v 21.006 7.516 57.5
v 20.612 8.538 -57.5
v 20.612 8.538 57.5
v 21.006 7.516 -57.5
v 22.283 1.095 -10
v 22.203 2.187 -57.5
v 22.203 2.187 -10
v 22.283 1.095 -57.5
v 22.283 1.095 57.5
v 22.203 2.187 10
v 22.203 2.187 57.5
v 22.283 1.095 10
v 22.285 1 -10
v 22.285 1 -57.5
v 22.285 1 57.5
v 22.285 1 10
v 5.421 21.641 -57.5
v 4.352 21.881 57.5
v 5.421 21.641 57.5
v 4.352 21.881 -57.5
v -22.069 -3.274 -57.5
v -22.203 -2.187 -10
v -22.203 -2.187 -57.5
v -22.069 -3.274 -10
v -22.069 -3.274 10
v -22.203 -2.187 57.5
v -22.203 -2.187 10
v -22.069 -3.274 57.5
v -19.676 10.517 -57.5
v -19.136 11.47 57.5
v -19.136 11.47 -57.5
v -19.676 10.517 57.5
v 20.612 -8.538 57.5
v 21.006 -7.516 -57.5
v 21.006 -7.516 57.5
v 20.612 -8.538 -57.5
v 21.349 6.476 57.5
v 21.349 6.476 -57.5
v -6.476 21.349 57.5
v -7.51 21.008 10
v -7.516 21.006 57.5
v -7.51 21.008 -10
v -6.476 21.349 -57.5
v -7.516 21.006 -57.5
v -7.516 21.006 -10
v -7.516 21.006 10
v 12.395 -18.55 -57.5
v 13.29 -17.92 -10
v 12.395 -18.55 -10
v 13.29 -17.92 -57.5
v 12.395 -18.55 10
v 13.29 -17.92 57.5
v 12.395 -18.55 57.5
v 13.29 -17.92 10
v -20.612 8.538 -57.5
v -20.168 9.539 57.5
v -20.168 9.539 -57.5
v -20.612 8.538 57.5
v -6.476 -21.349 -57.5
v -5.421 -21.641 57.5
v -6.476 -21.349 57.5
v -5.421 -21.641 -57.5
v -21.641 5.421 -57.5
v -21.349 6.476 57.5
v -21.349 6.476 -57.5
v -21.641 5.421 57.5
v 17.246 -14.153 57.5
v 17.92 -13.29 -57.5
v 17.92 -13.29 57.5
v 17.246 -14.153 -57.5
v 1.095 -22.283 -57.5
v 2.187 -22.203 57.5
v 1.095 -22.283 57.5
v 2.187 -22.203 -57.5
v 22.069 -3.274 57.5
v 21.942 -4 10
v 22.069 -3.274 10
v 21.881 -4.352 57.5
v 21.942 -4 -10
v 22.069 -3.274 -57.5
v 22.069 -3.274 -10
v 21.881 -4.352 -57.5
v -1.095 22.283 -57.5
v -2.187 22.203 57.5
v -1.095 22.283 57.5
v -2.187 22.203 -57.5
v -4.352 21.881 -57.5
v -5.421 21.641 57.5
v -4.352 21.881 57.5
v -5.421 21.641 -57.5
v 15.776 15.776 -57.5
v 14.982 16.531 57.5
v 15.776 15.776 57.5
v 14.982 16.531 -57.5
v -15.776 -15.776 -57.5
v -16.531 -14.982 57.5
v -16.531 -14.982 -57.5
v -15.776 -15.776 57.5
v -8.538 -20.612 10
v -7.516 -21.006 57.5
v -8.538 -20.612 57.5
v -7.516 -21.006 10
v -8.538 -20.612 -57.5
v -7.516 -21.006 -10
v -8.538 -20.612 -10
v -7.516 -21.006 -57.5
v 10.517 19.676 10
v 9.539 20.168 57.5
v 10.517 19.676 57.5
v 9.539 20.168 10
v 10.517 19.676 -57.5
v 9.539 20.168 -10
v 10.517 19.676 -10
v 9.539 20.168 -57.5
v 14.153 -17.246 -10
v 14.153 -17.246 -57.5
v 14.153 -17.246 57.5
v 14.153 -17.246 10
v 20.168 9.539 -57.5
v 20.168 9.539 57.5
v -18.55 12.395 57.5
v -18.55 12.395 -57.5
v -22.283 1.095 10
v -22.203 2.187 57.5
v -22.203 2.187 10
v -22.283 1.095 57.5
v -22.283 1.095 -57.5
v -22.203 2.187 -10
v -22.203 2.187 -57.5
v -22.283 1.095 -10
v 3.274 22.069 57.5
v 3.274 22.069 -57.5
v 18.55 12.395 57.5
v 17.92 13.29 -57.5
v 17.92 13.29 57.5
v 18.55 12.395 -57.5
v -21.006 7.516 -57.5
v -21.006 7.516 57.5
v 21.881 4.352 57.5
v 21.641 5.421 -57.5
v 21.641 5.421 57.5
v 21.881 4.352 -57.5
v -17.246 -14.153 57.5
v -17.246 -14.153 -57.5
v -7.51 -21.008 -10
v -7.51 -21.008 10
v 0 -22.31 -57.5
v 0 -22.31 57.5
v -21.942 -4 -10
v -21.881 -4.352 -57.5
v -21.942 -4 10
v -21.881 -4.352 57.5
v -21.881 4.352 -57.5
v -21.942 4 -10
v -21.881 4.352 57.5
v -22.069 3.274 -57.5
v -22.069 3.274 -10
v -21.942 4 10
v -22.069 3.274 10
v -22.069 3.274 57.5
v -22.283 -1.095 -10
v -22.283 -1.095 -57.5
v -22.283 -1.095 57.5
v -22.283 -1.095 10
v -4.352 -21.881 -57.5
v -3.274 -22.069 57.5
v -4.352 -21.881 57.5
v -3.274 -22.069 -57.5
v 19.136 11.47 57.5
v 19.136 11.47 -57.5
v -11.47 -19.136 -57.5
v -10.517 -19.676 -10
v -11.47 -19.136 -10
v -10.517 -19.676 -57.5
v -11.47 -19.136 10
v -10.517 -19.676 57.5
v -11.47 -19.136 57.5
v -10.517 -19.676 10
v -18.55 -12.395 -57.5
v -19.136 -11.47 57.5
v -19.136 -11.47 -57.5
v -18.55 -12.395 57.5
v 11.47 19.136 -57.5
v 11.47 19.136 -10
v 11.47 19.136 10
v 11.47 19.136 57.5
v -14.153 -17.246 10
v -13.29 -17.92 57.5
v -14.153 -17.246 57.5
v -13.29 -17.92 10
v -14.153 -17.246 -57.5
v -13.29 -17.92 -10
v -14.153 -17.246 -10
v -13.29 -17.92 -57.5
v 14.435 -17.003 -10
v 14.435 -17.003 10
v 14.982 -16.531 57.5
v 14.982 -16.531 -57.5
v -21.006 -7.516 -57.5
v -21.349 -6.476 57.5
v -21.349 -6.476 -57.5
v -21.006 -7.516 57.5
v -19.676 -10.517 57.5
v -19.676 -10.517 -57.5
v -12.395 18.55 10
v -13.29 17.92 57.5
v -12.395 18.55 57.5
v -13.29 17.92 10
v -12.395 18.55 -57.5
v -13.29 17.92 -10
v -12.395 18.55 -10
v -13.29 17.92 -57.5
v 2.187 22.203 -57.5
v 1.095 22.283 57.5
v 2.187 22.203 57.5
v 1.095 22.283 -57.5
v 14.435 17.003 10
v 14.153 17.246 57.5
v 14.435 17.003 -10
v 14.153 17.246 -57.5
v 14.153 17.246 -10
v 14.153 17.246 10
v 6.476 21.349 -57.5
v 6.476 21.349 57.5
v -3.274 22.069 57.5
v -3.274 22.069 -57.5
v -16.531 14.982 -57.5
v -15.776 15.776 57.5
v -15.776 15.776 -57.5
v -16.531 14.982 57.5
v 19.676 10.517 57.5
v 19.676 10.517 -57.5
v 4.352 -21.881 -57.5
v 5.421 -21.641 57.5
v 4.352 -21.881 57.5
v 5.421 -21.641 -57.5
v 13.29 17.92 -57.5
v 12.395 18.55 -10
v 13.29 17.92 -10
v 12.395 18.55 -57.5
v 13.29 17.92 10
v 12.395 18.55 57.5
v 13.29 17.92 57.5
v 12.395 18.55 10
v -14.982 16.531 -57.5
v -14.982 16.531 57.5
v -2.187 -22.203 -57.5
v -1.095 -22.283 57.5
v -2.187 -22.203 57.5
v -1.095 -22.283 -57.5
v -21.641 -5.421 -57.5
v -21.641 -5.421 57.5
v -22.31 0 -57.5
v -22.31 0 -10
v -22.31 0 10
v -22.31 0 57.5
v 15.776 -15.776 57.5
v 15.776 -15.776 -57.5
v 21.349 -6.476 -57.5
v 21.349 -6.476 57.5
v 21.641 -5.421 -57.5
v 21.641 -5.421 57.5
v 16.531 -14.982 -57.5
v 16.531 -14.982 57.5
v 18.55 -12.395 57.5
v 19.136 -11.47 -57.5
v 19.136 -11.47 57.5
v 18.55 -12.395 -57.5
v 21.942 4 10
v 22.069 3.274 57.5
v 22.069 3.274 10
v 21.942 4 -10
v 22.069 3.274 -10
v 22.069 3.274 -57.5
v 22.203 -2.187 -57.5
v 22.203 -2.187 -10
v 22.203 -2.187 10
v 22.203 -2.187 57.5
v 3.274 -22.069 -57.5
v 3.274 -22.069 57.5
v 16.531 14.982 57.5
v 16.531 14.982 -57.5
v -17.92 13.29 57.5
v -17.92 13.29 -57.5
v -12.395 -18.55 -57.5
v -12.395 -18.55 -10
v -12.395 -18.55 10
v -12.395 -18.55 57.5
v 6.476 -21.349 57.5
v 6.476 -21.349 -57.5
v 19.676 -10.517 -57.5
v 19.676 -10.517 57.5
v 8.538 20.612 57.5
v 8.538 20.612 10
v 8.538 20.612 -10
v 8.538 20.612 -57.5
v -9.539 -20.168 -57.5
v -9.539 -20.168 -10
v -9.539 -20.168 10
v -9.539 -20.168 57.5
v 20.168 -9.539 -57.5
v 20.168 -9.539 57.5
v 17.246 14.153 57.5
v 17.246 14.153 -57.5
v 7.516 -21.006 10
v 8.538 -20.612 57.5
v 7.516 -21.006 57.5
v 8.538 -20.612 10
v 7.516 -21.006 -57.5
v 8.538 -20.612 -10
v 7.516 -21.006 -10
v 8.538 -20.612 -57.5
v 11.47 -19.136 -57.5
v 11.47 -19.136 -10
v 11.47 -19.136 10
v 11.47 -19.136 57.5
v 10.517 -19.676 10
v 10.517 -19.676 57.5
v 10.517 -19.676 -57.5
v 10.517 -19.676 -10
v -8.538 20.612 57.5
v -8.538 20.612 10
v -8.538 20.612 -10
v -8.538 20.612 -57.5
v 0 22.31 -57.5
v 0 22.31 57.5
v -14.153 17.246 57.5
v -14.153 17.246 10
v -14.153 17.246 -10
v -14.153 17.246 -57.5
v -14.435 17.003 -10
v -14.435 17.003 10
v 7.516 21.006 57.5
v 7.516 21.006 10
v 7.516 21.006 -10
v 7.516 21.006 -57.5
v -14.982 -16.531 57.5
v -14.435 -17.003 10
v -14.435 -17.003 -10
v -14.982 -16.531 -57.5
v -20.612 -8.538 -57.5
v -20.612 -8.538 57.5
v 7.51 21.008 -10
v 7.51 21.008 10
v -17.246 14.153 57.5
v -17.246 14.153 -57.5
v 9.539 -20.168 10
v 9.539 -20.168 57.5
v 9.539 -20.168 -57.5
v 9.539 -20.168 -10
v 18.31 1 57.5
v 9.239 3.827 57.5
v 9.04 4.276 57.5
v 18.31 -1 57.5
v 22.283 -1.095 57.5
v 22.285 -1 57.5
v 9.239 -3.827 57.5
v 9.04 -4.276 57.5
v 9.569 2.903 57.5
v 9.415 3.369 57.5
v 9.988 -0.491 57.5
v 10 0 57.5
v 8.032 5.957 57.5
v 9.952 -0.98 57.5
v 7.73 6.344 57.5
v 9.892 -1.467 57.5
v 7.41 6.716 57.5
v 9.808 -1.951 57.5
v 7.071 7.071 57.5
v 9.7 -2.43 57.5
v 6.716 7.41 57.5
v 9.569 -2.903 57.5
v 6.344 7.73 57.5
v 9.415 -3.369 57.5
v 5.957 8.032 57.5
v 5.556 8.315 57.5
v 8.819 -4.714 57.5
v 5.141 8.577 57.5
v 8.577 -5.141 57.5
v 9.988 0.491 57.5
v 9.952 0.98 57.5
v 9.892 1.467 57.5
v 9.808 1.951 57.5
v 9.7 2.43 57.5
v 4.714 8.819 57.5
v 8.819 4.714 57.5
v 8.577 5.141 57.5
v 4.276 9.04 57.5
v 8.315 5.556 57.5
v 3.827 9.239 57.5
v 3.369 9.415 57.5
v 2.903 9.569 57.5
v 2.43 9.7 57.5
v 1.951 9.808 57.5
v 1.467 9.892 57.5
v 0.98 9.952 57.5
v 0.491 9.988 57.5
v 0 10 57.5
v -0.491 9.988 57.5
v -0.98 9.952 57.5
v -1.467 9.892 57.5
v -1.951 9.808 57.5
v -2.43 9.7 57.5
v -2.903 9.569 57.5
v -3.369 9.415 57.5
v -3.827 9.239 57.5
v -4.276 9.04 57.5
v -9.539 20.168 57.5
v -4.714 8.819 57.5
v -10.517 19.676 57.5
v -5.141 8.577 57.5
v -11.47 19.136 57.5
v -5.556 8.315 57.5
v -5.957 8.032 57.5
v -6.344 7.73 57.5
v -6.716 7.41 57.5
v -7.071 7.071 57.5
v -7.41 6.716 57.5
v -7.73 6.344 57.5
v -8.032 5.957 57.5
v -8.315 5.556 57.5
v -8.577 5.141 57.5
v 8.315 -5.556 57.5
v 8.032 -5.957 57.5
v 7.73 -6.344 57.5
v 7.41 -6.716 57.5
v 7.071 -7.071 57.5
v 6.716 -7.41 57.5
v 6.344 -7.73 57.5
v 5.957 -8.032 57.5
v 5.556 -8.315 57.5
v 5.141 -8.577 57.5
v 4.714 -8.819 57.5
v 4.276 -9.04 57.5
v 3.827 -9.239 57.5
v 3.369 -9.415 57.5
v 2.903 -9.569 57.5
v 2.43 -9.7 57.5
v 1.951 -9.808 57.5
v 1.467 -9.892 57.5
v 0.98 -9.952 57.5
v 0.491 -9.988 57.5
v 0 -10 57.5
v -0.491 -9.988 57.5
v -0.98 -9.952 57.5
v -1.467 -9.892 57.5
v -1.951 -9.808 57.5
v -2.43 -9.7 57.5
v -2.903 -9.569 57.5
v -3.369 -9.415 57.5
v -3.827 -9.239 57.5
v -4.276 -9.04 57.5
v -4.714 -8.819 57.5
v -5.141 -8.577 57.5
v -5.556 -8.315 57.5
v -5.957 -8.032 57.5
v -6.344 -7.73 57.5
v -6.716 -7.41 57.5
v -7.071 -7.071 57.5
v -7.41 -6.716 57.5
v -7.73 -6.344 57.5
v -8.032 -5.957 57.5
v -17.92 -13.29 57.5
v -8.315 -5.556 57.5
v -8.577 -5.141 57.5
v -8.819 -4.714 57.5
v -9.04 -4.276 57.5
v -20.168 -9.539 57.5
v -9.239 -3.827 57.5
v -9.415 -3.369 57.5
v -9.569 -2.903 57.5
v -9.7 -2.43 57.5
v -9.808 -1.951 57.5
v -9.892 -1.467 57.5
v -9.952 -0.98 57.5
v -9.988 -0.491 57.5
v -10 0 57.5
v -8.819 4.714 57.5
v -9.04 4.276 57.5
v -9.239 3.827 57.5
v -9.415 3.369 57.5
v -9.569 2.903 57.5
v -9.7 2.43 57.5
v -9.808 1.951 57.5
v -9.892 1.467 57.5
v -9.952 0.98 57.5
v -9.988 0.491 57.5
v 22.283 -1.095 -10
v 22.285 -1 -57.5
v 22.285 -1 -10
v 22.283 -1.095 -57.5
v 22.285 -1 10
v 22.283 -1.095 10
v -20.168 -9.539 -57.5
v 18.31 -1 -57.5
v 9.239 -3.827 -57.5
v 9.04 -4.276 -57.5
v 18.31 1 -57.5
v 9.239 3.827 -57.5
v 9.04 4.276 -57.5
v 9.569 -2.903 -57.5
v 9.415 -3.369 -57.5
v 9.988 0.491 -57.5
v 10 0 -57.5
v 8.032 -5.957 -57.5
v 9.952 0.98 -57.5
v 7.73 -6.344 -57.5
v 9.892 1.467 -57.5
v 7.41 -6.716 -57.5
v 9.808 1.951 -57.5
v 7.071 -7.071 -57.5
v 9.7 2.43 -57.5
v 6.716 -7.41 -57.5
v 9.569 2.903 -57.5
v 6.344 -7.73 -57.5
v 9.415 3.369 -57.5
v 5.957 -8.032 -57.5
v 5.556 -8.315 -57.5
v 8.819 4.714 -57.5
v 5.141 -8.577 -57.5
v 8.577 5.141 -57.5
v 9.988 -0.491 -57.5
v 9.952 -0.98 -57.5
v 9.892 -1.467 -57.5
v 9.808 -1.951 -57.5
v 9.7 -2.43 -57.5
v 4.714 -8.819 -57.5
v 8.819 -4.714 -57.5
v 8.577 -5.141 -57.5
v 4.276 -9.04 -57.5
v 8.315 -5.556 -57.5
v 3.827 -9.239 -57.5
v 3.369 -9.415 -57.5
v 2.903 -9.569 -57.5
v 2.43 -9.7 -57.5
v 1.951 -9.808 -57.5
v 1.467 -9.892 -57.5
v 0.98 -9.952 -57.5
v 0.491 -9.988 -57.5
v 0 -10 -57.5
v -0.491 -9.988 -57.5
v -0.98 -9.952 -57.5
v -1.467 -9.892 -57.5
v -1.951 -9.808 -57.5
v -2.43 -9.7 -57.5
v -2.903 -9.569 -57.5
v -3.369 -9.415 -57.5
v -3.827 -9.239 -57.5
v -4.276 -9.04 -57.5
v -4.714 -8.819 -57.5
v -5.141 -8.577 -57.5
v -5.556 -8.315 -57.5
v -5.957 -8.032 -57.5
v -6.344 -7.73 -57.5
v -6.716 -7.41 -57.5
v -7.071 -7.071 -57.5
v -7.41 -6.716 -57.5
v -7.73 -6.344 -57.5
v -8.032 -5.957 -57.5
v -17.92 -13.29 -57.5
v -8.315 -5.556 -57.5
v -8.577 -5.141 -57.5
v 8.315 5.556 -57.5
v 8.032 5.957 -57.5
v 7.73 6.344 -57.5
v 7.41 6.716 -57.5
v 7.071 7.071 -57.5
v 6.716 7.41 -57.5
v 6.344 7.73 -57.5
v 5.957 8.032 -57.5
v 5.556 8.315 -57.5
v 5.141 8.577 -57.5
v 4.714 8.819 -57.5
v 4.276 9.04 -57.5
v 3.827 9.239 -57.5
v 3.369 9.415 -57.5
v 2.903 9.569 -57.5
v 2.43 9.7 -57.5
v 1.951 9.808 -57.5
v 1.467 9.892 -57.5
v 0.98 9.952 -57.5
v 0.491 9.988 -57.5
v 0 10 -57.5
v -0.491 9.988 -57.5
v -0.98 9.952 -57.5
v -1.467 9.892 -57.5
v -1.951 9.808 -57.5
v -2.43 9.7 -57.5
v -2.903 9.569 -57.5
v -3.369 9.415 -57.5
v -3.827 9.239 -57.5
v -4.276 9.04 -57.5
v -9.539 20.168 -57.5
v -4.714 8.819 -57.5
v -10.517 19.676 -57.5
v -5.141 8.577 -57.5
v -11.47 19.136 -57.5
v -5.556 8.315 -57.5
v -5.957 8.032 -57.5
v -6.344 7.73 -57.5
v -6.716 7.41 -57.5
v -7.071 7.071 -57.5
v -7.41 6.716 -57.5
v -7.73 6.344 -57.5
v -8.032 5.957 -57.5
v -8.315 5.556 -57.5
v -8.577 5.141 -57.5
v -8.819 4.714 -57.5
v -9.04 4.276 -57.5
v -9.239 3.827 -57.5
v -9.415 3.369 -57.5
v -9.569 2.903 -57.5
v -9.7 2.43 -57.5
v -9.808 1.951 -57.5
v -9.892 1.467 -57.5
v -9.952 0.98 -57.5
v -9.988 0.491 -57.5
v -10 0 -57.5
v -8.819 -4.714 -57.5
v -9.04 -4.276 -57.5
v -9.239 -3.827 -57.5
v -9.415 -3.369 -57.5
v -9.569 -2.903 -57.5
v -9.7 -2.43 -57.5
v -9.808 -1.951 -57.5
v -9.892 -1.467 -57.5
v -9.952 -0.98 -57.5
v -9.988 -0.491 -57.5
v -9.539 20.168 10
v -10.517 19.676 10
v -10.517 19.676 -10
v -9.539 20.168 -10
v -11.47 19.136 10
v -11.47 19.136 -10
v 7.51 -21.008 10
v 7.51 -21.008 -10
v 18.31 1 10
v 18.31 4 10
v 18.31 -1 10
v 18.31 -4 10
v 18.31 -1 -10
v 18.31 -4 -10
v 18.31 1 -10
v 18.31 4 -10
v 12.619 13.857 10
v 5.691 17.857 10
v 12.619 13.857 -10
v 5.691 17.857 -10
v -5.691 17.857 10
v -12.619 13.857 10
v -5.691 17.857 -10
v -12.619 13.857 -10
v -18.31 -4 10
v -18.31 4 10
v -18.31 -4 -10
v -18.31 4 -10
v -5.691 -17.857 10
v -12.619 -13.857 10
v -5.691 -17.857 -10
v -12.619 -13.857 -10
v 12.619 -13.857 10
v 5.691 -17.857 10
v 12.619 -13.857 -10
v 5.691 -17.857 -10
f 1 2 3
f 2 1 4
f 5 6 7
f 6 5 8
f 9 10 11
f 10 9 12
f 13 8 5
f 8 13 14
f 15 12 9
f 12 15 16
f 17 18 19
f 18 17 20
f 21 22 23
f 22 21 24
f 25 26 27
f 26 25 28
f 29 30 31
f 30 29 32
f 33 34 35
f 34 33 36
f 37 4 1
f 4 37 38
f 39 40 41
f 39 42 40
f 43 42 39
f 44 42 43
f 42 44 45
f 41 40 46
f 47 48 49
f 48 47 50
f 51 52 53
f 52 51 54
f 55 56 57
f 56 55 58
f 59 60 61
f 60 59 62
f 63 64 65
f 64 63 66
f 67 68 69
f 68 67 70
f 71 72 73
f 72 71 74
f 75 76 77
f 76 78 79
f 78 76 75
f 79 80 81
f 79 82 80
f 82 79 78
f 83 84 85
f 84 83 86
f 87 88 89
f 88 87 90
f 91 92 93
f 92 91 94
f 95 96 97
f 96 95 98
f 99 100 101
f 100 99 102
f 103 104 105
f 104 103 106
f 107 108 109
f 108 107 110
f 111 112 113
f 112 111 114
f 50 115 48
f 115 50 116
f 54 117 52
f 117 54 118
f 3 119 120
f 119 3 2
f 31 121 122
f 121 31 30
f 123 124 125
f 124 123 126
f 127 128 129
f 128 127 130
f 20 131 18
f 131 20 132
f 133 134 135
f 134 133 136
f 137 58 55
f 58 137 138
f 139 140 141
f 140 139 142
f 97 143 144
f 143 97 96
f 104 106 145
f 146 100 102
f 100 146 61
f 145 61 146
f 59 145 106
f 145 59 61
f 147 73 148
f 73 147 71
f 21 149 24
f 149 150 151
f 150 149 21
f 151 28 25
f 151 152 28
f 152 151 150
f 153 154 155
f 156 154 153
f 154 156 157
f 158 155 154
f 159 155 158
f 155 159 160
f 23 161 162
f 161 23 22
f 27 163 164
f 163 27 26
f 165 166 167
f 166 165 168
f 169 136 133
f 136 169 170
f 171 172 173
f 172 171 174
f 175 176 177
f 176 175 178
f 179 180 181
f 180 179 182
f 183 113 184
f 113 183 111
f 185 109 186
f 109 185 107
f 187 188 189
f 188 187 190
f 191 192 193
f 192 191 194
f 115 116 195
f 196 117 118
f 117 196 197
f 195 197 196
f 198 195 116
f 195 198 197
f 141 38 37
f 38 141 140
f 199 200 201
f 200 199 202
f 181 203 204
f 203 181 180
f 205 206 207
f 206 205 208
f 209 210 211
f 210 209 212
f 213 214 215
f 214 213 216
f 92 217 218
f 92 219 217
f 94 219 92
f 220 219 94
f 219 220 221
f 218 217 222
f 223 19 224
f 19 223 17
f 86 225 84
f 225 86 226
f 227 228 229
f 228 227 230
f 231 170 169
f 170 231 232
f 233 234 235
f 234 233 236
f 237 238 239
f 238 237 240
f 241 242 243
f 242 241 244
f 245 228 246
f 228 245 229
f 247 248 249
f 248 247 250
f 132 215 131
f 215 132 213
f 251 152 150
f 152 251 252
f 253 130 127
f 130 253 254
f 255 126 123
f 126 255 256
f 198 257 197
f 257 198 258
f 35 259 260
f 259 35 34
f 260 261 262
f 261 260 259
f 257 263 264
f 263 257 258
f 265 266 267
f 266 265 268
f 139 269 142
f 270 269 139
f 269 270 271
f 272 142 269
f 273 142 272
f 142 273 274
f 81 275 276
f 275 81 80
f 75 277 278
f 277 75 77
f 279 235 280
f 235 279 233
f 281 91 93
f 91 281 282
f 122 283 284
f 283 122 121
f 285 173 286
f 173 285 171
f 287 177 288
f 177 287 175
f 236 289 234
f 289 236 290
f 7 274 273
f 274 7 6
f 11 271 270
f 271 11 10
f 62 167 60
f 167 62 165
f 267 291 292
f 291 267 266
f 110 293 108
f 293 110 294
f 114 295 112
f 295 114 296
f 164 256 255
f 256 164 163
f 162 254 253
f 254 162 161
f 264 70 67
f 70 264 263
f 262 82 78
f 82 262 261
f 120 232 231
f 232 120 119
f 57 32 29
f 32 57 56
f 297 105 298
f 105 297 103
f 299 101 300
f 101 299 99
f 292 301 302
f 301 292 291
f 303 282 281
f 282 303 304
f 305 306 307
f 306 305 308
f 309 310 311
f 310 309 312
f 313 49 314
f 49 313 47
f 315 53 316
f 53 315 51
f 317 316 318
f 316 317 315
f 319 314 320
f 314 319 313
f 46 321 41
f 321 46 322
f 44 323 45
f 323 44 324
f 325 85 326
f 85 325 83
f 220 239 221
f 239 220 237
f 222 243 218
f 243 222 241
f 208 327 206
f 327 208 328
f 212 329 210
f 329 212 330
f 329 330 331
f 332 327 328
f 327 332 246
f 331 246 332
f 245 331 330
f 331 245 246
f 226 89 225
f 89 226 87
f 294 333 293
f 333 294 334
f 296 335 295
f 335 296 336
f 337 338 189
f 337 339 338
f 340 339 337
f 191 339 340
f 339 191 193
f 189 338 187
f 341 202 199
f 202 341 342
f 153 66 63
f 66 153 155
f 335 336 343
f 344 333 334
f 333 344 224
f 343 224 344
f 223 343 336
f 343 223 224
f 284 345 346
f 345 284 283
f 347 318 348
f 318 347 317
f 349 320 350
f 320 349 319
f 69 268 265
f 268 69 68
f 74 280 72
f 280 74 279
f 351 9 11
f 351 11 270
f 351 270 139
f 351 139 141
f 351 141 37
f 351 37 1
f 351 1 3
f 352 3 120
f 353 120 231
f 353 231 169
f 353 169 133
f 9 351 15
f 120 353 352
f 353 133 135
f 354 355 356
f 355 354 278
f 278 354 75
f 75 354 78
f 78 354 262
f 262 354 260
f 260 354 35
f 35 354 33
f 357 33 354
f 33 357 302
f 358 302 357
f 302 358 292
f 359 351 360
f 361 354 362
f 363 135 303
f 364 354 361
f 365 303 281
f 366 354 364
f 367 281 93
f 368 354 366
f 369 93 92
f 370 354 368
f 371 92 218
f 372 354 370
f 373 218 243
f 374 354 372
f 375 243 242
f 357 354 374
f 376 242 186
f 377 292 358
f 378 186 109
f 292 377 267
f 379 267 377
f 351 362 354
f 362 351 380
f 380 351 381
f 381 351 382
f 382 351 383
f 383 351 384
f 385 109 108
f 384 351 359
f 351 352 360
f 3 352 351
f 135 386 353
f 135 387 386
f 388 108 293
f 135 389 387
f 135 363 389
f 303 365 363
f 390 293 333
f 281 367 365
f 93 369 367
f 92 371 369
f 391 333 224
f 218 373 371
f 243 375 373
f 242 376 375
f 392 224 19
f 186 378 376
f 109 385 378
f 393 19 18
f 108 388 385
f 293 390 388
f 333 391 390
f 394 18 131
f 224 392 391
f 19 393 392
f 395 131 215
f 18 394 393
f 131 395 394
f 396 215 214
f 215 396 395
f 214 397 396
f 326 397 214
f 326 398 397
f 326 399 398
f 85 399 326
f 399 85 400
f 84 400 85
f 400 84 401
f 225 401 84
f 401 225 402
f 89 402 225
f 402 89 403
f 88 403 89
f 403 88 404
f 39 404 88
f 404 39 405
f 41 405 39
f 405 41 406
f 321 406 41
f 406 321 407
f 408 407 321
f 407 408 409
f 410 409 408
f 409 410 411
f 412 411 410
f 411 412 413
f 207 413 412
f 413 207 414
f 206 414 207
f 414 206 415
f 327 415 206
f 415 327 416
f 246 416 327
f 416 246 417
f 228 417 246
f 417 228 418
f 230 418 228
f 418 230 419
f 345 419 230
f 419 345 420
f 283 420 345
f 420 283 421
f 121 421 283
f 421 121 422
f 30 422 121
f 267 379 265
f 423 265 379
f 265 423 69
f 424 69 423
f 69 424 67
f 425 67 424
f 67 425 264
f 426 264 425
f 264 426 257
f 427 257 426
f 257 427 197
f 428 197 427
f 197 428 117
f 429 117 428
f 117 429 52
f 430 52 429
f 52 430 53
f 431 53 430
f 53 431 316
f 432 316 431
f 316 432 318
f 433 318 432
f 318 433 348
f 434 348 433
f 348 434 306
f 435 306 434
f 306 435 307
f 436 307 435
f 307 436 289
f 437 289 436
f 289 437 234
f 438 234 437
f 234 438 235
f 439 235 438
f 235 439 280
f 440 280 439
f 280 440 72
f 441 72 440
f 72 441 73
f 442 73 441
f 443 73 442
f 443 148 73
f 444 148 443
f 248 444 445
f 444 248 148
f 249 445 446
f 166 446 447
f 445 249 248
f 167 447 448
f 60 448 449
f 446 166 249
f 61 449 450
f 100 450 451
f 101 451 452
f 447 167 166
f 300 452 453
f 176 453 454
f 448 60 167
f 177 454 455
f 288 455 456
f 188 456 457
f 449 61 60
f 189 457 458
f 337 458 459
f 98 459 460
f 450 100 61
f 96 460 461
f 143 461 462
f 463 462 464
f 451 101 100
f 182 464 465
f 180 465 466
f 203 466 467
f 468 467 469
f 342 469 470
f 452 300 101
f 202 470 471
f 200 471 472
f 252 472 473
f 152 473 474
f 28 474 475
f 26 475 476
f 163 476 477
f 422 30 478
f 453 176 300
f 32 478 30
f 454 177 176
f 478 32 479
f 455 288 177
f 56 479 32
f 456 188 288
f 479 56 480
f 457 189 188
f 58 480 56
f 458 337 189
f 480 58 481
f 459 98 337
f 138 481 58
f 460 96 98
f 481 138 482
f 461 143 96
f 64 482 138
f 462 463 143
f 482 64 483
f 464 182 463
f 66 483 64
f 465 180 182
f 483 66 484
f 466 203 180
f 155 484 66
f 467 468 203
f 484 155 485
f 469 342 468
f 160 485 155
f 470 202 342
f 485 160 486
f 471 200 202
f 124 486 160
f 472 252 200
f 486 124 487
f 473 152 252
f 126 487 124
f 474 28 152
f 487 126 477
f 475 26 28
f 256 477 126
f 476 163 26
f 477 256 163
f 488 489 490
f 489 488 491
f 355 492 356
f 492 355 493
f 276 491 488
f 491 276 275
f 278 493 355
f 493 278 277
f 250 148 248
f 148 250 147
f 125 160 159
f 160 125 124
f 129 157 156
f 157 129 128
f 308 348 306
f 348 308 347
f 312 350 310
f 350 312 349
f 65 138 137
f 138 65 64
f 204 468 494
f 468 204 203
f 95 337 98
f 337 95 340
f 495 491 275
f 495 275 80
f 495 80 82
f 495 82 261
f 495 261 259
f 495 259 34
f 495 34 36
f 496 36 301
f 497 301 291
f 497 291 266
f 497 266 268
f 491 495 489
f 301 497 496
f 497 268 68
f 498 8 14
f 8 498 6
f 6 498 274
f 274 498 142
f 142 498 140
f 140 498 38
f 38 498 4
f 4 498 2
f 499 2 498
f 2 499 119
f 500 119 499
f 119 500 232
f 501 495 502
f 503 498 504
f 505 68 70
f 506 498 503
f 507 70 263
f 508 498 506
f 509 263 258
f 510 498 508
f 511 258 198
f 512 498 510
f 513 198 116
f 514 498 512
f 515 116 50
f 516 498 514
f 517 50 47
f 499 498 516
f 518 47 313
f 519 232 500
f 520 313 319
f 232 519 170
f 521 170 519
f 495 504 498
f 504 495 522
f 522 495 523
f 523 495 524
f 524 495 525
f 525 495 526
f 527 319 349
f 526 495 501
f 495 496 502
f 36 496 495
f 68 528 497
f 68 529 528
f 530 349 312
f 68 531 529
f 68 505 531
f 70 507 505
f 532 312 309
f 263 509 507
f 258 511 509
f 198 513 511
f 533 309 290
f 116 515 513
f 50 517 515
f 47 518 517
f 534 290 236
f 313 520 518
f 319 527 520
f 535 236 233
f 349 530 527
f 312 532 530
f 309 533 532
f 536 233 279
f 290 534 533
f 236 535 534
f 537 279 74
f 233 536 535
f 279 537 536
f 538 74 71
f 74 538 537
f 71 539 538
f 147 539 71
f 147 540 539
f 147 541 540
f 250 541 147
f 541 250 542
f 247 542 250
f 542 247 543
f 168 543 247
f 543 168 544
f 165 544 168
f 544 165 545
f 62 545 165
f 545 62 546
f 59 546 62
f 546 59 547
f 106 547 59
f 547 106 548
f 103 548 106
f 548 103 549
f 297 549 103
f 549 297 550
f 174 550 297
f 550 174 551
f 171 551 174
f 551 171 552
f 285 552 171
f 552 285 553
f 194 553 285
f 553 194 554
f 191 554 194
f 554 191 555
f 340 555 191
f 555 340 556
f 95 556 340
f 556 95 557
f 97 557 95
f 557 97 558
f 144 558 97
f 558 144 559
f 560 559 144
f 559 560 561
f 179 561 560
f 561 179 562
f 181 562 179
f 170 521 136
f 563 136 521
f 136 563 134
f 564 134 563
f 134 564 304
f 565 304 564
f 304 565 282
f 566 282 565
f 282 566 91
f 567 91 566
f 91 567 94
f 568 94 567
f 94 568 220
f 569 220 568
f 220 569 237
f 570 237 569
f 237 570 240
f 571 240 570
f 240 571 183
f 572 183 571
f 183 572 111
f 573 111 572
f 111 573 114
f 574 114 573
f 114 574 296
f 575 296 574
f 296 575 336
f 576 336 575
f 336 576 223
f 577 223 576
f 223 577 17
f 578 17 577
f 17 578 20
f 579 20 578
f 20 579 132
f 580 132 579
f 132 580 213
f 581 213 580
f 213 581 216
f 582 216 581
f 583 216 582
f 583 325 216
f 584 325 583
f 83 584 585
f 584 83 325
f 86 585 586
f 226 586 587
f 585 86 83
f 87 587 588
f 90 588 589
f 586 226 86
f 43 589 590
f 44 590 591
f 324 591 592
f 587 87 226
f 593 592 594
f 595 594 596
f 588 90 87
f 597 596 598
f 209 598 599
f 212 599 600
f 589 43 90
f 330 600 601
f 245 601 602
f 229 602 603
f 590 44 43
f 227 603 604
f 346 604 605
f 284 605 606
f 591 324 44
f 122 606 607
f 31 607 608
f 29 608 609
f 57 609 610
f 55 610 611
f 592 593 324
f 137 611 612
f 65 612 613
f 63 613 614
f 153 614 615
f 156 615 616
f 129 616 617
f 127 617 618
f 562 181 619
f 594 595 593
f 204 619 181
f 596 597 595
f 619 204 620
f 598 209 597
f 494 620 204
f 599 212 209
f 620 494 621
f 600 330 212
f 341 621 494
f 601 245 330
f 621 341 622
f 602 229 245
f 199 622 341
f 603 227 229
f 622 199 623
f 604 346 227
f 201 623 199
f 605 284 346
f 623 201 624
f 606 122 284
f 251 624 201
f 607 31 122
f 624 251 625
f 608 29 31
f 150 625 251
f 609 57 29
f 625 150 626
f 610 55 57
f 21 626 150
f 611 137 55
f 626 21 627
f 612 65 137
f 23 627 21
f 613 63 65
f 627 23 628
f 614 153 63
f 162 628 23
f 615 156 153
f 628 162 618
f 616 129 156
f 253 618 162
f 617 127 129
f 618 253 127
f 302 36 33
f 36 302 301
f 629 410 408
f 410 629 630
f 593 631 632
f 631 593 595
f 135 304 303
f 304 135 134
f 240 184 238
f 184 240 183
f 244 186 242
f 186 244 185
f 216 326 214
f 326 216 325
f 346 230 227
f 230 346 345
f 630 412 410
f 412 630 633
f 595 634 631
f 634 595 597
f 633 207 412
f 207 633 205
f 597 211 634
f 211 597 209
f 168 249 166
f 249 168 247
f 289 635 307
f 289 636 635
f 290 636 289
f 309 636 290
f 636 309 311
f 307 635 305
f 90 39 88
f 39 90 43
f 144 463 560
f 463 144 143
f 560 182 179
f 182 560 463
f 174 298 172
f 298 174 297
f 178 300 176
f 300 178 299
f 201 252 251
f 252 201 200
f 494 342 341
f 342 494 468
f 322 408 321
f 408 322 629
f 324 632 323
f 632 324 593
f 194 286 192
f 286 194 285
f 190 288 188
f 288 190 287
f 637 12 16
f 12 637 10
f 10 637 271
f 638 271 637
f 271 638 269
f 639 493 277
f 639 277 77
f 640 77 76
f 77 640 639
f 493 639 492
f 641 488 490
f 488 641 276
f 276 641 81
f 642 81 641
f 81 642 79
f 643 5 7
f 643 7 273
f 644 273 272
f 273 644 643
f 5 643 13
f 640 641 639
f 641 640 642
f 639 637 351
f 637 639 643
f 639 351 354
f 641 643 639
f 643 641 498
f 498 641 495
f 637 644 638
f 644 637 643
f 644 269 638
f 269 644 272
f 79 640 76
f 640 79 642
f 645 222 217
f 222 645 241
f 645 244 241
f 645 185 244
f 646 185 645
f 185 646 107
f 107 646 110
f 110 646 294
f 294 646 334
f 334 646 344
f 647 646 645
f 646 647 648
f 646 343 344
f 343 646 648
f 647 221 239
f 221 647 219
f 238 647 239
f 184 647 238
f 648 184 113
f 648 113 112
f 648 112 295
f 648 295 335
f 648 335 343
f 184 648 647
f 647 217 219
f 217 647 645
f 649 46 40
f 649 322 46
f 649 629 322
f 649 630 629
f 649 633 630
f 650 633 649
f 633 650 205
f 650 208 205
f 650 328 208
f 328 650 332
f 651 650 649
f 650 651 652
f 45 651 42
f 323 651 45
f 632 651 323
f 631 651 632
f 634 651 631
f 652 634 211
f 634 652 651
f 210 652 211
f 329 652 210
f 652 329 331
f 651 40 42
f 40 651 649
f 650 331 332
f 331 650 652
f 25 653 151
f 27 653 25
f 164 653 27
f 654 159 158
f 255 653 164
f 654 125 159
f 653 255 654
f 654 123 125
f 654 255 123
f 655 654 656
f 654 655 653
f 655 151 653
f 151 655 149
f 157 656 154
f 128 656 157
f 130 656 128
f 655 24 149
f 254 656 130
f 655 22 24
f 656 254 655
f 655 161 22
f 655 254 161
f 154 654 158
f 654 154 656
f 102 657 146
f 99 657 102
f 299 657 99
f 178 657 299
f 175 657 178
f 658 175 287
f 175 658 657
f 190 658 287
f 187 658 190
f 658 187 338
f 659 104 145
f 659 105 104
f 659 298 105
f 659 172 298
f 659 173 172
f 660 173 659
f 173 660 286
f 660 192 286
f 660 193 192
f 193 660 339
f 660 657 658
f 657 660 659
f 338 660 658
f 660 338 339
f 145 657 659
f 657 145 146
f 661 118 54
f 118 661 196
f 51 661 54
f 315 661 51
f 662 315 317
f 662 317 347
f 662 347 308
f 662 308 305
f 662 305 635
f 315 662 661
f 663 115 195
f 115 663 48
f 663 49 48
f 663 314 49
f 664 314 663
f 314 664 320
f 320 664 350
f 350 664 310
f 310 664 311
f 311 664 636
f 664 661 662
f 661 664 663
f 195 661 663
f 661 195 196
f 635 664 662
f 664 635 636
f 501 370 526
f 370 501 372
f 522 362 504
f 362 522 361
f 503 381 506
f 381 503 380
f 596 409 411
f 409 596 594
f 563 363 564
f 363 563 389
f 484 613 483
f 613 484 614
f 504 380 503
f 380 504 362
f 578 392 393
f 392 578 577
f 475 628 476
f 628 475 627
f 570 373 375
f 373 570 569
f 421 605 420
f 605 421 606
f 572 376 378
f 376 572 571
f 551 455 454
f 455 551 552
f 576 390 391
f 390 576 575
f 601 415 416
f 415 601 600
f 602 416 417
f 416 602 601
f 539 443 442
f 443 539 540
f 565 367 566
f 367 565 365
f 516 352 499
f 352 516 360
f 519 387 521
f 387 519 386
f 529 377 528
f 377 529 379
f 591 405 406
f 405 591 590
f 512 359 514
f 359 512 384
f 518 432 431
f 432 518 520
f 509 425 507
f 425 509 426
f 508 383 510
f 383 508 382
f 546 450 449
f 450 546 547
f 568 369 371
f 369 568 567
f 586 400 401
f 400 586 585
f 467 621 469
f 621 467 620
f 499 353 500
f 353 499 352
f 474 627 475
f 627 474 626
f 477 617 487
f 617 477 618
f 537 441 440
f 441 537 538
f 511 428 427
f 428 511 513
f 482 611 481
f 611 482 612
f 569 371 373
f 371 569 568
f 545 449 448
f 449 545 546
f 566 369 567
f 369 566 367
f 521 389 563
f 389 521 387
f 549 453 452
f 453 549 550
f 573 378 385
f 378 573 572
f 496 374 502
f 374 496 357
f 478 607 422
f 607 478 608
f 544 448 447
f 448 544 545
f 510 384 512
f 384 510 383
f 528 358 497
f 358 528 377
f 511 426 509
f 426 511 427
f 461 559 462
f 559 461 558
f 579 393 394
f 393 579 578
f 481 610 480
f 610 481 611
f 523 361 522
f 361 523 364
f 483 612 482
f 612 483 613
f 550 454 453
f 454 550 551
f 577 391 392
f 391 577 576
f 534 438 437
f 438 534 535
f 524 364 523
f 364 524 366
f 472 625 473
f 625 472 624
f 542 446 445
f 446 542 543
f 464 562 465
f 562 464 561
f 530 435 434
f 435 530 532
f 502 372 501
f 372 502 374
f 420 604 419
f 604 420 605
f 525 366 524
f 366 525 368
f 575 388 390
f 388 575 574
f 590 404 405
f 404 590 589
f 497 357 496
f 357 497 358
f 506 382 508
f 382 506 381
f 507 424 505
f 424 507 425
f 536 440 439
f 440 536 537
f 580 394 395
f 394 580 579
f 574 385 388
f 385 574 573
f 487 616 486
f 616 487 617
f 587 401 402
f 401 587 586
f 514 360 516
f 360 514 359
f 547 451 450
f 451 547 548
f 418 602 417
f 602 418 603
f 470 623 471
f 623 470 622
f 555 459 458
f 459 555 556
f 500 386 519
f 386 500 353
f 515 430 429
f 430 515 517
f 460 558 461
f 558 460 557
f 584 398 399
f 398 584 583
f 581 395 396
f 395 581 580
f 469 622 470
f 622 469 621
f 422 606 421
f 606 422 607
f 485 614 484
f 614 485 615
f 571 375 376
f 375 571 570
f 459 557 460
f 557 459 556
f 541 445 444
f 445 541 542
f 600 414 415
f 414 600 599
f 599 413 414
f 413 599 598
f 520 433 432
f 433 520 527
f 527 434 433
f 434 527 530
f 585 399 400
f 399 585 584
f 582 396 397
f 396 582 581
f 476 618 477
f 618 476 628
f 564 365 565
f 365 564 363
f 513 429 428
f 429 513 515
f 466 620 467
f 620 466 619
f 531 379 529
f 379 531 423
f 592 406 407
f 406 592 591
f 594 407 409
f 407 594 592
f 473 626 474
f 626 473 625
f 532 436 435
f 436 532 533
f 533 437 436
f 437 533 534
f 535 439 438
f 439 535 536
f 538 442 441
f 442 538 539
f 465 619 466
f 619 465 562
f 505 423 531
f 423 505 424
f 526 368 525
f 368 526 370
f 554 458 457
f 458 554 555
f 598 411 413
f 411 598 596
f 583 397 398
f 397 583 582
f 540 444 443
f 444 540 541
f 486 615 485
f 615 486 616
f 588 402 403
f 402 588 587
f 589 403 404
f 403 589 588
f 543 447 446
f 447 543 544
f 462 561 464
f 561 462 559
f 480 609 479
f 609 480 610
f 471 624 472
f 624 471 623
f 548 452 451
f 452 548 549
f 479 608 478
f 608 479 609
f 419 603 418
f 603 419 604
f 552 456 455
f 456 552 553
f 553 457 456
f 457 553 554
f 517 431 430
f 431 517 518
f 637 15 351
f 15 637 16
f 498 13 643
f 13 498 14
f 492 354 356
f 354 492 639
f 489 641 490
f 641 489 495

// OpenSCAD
$fn = 128;

// Parameters (match given bounding box and requested features)
bbox_X = 45.0;          // overall X bound
bbox_Y = 44.62;         // overall Y bound (also used as outer_D)
H = 115.0;              // height

outer_D = 44.62;        // outer diameter (Y bound)
bore_D  = 20.0;         // central bore diameter

notch_count = 6;        // several notches around circumference
notch_ang_offset_deg = 0.0;

notch_depth_radial = 4.0;       // how far notch cuts into OD
notch_width_tangential = 8.0;   // notch width along tangent
notch_height_Z = 20.0;          // notch height along Z
notch_Z_center = 0.0;           // notch vertical position

// Split/key feature (a slit through the wall)
split_width_tangential = 2.0;   // slit width (tangential)
split_depth_radial = notch_depth_radial; // cut into OD similarly
split_ang_deg = 0.0;            // angle of split

overlap = 1.0;                  // boolean robustness

// Derived
outer_R = outer_D/2;

// Base body: cylinder trimmed to bbox_X in X (gives slightly "circular/square" cross-section)
module outer_profile() {
  intersection() {
    cylinder(r=outer_R, h=H, center=true);
    // Trim in X to hit bbox_X exactly, keep Y unconstrained (outer_D already sets Y)
    cube([bbox_X, outer_D*2, H + 2*overlap], center=true);
  }
}

module central_through_bore() {
  cylinder(r=bore_D/2, h=H + 2*overlap, center=true);
}

// Rectangular notch cutter placed at OD and rotated around Z
module notch_cut_at_angle(a_deg) {
  rotate([0,0,a_deg])
    translate([outer_R - notch_depth_radial/2 + overlap, 0, notch_Z_center])
      cube([notch_depth_radial + 2*overlap,
            notch_width_tangential,
            notch_height_Z],
           center=true);
}

module circumferential_notches() {
  for (i = [0:notch_count-1])
    notch_cut_at_angle(notch_ang_offset_deg + i*360/notch_count);
}

// Split/key slit cutter (a deeper/continuous-looking interruption)
module split_slit() {
  rotate([0,0,split_ang_deg])
    translate([outer_R - split_depth_radial/2 + overlap, 0, 0])
      cube([split_depth_radial + 2*overlap,
            split_width_tangential,
            H + 2*overlap],
           center=true);
}

module all_subtractive_features() {
  union() {
    central_through_bore();
    circumferential_notches();
    split_slit();
  }
}

// Final
difference() {
  outer_profile();
  all_subtractive_features();
}
